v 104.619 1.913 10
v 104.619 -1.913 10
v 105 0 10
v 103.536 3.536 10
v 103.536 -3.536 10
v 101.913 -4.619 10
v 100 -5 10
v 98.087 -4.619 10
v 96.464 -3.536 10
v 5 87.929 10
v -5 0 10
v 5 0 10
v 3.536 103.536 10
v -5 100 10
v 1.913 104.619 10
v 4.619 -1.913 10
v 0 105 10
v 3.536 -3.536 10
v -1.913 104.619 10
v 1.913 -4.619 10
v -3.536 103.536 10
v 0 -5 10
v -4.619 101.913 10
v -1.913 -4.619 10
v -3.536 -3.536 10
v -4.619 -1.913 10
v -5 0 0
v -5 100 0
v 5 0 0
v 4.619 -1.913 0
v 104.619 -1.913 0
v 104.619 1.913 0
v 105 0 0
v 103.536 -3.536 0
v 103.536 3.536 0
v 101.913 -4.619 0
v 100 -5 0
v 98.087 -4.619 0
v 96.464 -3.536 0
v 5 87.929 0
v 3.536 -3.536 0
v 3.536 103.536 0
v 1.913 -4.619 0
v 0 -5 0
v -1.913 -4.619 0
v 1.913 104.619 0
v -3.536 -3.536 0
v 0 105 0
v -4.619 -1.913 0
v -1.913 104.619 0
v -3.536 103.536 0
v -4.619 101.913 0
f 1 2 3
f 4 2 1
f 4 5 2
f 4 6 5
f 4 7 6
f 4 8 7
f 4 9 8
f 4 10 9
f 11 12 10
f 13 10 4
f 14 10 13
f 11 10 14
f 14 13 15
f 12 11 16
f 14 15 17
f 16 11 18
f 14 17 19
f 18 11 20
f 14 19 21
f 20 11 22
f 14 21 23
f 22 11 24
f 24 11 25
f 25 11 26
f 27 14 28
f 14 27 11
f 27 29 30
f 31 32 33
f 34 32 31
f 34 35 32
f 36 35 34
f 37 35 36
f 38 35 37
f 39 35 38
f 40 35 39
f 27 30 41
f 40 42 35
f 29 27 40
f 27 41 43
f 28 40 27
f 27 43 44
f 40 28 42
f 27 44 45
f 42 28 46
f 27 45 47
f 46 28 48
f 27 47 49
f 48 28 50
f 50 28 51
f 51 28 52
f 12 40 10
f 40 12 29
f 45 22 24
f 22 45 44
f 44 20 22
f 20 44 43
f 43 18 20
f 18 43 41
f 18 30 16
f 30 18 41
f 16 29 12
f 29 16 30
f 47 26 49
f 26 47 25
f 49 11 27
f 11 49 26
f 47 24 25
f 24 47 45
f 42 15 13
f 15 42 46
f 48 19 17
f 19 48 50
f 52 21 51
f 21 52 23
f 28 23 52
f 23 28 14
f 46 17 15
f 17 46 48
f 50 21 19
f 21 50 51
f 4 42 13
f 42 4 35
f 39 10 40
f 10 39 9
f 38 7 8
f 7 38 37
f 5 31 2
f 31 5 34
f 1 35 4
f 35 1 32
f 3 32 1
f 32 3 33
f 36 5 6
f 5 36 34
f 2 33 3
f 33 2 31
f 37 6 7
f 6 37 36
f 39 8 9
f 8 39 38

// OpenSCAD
width = 10;
depth=50;
start = [0, 0, 0];
goal = [0, 300, 0];
               
module joint_channel(point=[0, 0, 0], width=width){
    translate(point) cylinder(width, d=width);
};

module straight_channel(start=[0, 0, 0], goal=[0,10,0], width=width){
    length = norm(goal - start);

    a = [length, 0, 0];
    b = goal - start;
    
    n = cross(a, b);
    theta = acos(a*b/(norm(a)*norm(b)));
    
    translate(start)
    rotate(theta, n){
        translate([0, -width/2, 0])
        cube([length, width, width]);
    };
    
    joint_channel(start);
    joint_channel(goal);
};


module io(depth=depth, diameter=5){
    cylinder(depth, d=diameter);
};


p1 = [0, 0, 0];
p2 = [0, 100, 0];
p3 = [100, 0, 0];

straight_channel(p1, p2);
straight_channel(p2, p3);
